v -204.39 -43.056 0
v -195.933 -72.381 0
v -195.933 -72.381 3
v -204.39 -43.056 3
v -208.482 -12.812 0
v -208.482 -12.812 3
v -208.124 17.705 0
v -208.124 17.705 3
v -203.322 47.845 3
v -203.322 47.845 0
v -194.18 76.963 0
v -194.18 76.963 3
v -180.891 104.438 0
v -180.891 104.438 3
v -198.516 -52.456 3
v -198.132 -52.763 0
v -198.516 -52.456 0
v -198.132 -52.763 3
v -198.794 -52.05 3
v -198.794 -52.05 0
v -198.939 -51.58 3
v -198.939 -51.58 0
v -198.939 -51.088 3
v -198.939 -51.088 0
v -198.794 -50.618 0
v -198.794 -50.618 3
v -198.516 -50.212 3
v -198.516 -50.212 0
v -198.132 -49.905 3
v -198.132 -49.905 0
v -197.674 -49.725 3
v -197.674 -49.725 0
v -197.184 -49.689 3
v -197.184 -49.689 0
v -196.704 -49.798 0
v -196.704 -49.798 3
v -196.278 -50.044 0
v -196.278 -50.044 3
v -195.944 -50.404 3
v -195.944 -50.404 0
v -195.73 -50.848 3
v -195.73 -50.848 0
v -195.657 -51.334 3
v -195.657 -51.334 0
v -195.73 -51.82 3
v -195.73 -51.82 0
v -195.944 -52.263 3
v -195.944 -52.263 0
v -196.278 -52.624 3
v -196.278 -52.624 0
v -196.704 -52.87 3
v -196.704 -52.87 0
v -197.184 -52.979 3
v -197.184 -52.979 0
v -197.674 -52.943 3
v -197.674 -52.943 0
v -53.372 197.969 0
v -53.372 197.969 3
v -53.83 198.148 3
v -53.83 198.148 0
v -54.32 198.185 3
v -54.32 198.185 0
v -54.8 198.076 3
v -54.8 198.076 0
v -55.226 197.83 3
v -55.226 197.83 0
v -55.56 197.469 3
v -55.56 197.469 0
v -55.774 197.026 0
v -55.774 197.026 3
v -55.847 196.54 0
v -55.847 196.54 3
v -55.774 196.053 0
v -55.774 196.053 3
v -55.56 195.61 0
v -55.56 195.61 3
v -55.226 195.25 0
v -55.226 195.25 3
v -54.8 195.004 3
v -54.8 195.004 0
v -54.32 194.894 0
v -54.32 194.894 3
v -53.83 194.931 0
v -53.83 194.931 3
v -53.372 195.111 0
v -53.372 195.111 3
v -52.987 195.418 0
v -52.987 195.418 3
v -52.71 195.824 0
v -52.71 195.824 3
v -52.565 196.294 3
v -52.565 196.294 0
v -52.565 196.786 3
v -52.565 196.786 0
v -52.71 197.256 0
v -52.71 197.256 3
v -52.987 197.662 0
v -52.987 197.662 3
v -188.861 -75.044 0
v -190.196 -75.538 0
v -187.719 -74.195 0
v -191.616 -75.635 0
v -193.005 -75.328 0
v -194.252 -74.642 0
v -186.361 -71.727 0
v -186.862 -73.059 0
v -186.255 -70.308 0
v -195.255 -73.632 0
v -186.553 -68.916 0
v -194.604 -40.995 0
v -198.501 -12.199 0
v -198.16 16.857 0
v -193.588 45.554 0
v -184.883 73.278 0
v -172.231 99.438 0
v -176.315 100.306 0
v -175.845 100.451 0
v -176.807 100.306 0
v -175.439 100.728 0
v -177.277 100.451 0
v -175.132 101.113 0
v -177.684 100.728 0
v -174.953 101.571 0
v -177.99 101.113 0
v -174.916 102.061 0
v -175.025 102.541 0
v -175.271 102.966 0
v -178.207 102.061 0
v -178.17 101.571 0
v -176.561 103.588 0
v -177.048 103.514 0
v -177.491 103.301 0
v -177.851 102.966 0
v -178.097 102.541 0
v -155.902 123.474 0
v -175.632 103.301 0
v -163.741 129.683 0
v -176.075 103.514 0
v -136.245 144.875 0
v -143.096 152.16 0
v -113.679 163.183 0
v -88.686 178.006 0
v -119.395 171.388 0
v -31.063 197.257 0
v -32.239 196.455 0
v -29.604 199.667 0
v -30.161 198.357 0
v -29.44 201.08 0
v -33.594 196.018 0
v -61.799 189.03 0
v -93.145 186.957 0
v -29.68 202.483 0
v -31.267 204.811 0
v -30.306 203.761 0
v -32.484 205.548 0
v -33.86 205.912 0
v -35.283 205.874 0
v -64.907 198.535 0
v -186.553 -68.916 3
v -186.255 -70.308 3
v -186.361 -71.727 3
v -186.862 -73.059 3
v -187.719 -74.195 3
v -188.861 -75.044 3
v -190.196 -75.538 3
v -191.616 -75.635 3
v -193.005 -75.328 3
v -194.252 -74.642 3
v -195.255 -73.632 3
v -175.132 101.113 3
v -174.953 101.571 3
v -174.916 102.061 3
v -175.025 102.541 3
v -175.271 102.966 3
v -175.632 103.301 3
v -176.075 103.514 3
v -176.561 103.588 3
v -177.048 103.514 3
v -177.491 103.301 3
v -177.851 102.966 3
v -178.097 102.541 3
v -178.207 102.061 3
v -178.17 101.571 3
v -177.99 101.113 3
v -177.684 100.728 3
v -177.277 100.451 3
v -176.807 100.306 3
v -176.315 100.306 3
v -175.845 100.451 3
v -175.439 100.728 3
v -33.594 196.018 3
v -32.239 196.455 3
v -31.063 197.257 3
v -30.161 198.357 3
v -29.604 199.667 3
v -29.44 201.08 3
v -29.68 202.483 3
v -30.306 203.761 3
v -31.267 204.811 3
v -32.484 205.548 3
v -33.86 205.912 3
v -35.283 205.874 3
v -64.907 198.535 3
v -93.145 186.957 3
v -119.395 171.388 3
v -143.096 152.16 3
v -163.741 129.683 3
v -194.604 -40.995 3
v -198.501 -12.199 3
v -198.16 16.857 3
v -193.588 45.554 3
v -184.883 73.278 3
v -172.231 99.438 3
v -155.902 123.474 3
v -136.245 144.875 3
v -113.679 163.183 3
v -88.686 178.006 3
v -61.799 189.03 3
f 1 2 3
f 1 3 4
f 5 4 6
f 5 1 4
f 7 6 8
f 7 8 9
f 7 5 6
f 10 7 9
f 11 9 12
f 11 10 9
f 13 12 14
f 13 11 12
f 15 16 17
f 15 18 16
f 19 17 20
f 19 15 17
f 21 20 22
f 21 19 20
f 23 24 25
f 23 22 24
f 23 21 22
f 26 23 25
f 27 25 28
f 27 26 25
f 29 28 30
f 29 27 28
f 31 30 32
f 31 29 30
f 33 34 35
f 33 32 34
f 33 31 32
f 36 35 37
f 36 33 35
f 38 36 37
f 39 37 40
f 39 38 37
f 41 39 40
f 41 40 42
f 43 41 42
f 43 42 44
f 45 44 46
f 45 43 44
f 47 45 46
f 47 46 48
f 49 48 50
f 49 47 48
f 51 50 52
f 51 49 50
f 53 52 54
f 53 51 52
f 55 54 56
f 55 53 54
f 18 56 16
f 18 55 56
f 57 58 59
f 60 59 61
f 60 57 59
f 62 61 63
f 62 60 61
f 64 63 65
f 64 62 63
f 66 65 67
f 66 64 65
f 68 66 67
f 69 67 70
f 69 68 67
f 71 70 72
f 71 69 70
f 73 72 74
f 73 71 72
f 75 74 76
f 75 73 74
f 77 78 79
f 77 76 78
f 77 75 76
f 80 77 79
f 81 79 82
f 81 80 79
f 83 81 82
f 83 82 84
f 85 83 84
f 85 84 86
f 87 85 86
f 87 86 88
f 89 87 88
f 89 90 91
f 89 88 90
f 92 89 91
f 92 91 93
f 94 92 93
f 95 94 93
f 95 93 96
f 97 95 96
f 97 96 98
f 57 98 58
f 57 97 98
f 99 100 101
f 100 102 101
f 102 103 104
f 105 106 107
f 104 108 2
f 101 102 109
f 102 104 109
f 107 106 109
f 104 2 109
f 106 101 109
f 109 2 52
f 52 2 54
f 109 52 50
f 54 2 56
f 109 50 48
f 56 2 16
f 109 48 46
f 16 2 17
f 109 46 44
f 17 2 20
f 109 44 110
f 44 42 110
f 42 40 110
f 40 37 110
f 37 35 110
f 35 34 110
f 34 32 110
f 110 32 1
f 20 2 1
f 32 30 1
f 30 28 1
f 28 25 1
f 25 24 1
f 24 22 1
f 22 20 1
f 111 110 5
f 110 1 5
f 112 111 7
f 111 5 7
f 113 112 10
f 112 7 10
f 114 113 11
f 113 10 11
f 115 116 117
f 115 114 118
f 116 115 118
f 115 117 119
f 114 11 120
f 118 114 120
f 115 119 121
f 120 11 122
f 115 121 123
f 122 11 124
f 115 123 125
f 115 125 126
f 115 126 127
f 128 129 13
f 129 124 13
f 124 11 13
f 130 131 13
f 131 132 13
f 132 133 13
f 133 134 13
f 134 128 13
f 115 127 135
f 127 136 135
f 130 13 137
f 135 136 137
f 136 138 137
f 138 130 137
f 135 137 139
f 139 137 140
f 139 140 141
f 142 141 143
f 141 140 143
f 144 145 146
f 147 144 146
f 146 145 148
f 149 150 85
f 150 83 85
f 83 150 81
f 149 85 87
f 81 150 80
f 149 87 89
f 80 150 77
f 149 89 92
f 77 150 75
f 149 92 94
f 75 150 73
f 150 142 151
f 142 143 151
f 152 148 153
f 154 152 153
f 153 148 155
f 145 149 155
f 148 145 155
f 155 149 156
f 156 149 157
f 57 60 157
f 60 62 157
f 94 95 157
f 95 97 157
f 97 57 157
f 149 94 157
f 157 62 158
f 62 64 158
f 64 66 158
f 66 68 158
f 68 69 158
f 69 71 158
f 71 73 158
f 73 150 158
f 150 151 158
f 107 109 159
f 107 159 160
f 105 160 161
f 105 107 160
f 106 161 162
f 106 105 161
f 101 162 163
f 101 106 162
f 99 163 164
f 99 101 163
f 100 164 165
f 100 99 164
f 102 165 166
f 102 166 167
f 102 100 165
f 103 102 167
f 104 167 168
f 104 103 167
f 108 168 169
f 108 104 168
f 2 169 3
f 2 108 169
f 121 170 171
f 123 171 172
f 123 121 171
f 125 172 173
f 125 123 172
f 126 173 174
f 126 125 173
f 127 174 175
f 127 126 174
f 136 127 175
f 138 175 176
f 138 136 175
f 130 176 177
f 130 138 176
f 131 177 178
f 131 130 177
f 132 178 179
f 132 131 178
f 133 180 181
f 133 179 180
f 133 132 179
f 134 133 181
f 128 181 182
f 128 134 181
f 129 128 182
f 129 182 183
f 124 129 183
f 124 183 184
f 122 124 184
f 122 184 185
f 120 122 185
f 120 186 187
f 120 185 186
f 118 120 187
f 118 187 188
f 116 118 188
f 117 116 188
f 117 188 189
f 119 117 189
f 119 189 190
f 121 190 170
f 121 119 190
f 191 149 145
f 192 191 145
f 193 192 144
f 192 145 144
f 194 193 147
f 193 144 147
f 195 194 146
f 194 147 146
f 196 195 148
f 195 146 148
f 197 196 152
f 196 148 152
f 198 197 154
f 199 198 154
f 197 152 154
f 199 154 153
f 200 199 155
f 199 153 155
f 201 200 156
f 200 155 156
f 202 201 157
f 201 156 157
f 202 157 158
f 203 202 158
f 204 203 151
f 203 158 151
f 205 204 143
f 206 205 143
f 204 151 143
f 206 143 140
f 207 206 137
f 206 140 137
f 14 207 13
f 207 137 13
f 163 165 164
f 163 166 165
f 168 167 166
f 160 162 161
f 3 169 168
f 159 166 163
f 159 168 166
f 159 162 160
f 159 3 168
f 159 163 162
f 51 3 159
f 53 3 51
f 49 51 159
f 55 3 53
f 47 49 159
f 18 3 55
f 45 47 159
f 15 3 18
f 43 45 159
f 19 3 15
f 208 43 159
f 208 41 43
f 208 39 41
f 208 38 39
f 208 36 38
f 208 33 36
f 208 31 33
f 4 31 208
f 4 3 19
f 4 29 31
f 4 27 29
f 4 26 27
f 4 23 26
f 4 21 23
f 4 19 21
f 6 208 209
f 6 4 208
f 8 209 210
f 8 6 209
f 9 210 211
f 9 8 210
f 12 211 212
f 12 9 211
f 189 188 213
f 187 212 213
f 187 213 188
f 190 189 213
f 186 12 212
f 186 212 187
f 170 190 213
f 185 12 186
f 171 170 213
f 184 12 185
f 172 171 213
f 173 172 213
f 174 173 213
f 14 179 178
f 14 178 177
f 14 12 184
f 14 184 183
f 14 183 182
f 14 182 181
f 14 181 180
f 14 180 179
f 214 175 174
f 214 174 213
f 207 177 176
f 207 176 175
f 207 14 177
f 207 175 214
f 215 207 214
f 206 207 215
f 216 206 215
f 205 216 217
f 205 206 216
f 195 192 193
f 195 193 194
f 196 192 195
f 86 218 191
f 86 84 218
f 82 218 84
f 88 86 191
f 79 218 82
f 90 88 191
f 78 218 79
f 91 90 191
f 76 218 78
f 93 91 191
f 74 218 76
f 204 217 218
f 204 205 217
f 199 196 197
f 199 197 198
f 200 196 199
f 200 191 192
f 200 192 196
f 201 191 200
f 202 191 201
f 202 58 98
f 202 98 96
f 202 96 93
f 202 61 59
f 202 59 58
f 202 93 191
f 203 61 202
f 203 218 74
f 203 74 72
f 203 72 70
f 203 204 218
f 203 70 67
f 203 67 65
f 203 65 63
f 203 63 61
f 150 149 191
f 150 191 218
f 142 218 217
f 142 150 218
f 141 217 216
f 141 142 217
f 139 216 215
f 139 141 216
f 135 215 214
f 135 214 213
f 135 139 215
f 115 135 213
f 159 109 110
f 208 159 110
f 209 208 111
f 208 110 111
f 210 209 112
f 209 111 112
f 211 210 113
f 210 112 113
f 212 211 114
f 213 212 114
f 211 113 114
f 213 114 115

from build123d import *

# Parameters (mm, degrees)
PAD014_DEPTH                        = 3
SKETCH055_R                         = 1.65
POCKET019_DEPTH                     = 364.282338
POCKET019_DEPTH_BACK                = 367.282338
BODY001003005003003_PLACEMENT_ANGLE = 60


with BuildPart() as part:
    # Sketch052 → Pad014 (new body)
    with BuildSketch(Plane.XY):
        with BuildLine():
            ThreePointArc((152.959511, 127.101705), (84.480895, 180.040089), (0, 198.875477))
            Line((0, 198.875477), (0, 208.875477))
            ThreePointArc((160.650731, 133.492724), (88.728824, 189.092995), (0, 208.875477))
            ThreePointArc((152.959511, 127.101705), (160.000631, 126.451604), (160.650731, 133.492724))
        make_face()
    pad014 = extrude(amount=PAD014_DEPTH)

    # Sketch055 → Pocket019 (cut, two sides)
    with BuildSketch(Plane.XY) as pocket019_sk:
        with Locations((143.11, 145.205847)):
            Circle(SKETCH055_R)
        with BuildLine():
            Line((0, 202.225477), (0, 205.525477))
            ThreePointArc((0, 202.225477), (1.65, 203.875477), (0, 205.525477))
        make_face()
    pocket019 = extrude(amount=-POCKET019_DEPTH, mode=Mode.SUBTRACT) + extrude(pocket019_sk.sketch, amount=POCKET019_DEPTH_BACK, mode=Mode.SUBTRACT)

    # Mirrored019: Pad014, Pocket019 across Sketch052 V_Axis
    add(pad014.mirror(Plane(origin=(0, 0, 0), x_dir=(0, 0, 1), z_dir=(1, 0, 0))))
    add(pocket019.mirror(Plane(origin=(0, 0, 0), x_dir=(0, 0, 1), z_dir=(1, 0, 0))), mode=Mode.SUBTRACT)


with BuildPart() as part_1:
    # Body001003005003003 placement: moved
    add(part.part.rotate(Axis((0, 0, 0), (0, 0, 1)), BODY001003005003003_PLACEMENT_ANGLE))


solid = part_1.part
